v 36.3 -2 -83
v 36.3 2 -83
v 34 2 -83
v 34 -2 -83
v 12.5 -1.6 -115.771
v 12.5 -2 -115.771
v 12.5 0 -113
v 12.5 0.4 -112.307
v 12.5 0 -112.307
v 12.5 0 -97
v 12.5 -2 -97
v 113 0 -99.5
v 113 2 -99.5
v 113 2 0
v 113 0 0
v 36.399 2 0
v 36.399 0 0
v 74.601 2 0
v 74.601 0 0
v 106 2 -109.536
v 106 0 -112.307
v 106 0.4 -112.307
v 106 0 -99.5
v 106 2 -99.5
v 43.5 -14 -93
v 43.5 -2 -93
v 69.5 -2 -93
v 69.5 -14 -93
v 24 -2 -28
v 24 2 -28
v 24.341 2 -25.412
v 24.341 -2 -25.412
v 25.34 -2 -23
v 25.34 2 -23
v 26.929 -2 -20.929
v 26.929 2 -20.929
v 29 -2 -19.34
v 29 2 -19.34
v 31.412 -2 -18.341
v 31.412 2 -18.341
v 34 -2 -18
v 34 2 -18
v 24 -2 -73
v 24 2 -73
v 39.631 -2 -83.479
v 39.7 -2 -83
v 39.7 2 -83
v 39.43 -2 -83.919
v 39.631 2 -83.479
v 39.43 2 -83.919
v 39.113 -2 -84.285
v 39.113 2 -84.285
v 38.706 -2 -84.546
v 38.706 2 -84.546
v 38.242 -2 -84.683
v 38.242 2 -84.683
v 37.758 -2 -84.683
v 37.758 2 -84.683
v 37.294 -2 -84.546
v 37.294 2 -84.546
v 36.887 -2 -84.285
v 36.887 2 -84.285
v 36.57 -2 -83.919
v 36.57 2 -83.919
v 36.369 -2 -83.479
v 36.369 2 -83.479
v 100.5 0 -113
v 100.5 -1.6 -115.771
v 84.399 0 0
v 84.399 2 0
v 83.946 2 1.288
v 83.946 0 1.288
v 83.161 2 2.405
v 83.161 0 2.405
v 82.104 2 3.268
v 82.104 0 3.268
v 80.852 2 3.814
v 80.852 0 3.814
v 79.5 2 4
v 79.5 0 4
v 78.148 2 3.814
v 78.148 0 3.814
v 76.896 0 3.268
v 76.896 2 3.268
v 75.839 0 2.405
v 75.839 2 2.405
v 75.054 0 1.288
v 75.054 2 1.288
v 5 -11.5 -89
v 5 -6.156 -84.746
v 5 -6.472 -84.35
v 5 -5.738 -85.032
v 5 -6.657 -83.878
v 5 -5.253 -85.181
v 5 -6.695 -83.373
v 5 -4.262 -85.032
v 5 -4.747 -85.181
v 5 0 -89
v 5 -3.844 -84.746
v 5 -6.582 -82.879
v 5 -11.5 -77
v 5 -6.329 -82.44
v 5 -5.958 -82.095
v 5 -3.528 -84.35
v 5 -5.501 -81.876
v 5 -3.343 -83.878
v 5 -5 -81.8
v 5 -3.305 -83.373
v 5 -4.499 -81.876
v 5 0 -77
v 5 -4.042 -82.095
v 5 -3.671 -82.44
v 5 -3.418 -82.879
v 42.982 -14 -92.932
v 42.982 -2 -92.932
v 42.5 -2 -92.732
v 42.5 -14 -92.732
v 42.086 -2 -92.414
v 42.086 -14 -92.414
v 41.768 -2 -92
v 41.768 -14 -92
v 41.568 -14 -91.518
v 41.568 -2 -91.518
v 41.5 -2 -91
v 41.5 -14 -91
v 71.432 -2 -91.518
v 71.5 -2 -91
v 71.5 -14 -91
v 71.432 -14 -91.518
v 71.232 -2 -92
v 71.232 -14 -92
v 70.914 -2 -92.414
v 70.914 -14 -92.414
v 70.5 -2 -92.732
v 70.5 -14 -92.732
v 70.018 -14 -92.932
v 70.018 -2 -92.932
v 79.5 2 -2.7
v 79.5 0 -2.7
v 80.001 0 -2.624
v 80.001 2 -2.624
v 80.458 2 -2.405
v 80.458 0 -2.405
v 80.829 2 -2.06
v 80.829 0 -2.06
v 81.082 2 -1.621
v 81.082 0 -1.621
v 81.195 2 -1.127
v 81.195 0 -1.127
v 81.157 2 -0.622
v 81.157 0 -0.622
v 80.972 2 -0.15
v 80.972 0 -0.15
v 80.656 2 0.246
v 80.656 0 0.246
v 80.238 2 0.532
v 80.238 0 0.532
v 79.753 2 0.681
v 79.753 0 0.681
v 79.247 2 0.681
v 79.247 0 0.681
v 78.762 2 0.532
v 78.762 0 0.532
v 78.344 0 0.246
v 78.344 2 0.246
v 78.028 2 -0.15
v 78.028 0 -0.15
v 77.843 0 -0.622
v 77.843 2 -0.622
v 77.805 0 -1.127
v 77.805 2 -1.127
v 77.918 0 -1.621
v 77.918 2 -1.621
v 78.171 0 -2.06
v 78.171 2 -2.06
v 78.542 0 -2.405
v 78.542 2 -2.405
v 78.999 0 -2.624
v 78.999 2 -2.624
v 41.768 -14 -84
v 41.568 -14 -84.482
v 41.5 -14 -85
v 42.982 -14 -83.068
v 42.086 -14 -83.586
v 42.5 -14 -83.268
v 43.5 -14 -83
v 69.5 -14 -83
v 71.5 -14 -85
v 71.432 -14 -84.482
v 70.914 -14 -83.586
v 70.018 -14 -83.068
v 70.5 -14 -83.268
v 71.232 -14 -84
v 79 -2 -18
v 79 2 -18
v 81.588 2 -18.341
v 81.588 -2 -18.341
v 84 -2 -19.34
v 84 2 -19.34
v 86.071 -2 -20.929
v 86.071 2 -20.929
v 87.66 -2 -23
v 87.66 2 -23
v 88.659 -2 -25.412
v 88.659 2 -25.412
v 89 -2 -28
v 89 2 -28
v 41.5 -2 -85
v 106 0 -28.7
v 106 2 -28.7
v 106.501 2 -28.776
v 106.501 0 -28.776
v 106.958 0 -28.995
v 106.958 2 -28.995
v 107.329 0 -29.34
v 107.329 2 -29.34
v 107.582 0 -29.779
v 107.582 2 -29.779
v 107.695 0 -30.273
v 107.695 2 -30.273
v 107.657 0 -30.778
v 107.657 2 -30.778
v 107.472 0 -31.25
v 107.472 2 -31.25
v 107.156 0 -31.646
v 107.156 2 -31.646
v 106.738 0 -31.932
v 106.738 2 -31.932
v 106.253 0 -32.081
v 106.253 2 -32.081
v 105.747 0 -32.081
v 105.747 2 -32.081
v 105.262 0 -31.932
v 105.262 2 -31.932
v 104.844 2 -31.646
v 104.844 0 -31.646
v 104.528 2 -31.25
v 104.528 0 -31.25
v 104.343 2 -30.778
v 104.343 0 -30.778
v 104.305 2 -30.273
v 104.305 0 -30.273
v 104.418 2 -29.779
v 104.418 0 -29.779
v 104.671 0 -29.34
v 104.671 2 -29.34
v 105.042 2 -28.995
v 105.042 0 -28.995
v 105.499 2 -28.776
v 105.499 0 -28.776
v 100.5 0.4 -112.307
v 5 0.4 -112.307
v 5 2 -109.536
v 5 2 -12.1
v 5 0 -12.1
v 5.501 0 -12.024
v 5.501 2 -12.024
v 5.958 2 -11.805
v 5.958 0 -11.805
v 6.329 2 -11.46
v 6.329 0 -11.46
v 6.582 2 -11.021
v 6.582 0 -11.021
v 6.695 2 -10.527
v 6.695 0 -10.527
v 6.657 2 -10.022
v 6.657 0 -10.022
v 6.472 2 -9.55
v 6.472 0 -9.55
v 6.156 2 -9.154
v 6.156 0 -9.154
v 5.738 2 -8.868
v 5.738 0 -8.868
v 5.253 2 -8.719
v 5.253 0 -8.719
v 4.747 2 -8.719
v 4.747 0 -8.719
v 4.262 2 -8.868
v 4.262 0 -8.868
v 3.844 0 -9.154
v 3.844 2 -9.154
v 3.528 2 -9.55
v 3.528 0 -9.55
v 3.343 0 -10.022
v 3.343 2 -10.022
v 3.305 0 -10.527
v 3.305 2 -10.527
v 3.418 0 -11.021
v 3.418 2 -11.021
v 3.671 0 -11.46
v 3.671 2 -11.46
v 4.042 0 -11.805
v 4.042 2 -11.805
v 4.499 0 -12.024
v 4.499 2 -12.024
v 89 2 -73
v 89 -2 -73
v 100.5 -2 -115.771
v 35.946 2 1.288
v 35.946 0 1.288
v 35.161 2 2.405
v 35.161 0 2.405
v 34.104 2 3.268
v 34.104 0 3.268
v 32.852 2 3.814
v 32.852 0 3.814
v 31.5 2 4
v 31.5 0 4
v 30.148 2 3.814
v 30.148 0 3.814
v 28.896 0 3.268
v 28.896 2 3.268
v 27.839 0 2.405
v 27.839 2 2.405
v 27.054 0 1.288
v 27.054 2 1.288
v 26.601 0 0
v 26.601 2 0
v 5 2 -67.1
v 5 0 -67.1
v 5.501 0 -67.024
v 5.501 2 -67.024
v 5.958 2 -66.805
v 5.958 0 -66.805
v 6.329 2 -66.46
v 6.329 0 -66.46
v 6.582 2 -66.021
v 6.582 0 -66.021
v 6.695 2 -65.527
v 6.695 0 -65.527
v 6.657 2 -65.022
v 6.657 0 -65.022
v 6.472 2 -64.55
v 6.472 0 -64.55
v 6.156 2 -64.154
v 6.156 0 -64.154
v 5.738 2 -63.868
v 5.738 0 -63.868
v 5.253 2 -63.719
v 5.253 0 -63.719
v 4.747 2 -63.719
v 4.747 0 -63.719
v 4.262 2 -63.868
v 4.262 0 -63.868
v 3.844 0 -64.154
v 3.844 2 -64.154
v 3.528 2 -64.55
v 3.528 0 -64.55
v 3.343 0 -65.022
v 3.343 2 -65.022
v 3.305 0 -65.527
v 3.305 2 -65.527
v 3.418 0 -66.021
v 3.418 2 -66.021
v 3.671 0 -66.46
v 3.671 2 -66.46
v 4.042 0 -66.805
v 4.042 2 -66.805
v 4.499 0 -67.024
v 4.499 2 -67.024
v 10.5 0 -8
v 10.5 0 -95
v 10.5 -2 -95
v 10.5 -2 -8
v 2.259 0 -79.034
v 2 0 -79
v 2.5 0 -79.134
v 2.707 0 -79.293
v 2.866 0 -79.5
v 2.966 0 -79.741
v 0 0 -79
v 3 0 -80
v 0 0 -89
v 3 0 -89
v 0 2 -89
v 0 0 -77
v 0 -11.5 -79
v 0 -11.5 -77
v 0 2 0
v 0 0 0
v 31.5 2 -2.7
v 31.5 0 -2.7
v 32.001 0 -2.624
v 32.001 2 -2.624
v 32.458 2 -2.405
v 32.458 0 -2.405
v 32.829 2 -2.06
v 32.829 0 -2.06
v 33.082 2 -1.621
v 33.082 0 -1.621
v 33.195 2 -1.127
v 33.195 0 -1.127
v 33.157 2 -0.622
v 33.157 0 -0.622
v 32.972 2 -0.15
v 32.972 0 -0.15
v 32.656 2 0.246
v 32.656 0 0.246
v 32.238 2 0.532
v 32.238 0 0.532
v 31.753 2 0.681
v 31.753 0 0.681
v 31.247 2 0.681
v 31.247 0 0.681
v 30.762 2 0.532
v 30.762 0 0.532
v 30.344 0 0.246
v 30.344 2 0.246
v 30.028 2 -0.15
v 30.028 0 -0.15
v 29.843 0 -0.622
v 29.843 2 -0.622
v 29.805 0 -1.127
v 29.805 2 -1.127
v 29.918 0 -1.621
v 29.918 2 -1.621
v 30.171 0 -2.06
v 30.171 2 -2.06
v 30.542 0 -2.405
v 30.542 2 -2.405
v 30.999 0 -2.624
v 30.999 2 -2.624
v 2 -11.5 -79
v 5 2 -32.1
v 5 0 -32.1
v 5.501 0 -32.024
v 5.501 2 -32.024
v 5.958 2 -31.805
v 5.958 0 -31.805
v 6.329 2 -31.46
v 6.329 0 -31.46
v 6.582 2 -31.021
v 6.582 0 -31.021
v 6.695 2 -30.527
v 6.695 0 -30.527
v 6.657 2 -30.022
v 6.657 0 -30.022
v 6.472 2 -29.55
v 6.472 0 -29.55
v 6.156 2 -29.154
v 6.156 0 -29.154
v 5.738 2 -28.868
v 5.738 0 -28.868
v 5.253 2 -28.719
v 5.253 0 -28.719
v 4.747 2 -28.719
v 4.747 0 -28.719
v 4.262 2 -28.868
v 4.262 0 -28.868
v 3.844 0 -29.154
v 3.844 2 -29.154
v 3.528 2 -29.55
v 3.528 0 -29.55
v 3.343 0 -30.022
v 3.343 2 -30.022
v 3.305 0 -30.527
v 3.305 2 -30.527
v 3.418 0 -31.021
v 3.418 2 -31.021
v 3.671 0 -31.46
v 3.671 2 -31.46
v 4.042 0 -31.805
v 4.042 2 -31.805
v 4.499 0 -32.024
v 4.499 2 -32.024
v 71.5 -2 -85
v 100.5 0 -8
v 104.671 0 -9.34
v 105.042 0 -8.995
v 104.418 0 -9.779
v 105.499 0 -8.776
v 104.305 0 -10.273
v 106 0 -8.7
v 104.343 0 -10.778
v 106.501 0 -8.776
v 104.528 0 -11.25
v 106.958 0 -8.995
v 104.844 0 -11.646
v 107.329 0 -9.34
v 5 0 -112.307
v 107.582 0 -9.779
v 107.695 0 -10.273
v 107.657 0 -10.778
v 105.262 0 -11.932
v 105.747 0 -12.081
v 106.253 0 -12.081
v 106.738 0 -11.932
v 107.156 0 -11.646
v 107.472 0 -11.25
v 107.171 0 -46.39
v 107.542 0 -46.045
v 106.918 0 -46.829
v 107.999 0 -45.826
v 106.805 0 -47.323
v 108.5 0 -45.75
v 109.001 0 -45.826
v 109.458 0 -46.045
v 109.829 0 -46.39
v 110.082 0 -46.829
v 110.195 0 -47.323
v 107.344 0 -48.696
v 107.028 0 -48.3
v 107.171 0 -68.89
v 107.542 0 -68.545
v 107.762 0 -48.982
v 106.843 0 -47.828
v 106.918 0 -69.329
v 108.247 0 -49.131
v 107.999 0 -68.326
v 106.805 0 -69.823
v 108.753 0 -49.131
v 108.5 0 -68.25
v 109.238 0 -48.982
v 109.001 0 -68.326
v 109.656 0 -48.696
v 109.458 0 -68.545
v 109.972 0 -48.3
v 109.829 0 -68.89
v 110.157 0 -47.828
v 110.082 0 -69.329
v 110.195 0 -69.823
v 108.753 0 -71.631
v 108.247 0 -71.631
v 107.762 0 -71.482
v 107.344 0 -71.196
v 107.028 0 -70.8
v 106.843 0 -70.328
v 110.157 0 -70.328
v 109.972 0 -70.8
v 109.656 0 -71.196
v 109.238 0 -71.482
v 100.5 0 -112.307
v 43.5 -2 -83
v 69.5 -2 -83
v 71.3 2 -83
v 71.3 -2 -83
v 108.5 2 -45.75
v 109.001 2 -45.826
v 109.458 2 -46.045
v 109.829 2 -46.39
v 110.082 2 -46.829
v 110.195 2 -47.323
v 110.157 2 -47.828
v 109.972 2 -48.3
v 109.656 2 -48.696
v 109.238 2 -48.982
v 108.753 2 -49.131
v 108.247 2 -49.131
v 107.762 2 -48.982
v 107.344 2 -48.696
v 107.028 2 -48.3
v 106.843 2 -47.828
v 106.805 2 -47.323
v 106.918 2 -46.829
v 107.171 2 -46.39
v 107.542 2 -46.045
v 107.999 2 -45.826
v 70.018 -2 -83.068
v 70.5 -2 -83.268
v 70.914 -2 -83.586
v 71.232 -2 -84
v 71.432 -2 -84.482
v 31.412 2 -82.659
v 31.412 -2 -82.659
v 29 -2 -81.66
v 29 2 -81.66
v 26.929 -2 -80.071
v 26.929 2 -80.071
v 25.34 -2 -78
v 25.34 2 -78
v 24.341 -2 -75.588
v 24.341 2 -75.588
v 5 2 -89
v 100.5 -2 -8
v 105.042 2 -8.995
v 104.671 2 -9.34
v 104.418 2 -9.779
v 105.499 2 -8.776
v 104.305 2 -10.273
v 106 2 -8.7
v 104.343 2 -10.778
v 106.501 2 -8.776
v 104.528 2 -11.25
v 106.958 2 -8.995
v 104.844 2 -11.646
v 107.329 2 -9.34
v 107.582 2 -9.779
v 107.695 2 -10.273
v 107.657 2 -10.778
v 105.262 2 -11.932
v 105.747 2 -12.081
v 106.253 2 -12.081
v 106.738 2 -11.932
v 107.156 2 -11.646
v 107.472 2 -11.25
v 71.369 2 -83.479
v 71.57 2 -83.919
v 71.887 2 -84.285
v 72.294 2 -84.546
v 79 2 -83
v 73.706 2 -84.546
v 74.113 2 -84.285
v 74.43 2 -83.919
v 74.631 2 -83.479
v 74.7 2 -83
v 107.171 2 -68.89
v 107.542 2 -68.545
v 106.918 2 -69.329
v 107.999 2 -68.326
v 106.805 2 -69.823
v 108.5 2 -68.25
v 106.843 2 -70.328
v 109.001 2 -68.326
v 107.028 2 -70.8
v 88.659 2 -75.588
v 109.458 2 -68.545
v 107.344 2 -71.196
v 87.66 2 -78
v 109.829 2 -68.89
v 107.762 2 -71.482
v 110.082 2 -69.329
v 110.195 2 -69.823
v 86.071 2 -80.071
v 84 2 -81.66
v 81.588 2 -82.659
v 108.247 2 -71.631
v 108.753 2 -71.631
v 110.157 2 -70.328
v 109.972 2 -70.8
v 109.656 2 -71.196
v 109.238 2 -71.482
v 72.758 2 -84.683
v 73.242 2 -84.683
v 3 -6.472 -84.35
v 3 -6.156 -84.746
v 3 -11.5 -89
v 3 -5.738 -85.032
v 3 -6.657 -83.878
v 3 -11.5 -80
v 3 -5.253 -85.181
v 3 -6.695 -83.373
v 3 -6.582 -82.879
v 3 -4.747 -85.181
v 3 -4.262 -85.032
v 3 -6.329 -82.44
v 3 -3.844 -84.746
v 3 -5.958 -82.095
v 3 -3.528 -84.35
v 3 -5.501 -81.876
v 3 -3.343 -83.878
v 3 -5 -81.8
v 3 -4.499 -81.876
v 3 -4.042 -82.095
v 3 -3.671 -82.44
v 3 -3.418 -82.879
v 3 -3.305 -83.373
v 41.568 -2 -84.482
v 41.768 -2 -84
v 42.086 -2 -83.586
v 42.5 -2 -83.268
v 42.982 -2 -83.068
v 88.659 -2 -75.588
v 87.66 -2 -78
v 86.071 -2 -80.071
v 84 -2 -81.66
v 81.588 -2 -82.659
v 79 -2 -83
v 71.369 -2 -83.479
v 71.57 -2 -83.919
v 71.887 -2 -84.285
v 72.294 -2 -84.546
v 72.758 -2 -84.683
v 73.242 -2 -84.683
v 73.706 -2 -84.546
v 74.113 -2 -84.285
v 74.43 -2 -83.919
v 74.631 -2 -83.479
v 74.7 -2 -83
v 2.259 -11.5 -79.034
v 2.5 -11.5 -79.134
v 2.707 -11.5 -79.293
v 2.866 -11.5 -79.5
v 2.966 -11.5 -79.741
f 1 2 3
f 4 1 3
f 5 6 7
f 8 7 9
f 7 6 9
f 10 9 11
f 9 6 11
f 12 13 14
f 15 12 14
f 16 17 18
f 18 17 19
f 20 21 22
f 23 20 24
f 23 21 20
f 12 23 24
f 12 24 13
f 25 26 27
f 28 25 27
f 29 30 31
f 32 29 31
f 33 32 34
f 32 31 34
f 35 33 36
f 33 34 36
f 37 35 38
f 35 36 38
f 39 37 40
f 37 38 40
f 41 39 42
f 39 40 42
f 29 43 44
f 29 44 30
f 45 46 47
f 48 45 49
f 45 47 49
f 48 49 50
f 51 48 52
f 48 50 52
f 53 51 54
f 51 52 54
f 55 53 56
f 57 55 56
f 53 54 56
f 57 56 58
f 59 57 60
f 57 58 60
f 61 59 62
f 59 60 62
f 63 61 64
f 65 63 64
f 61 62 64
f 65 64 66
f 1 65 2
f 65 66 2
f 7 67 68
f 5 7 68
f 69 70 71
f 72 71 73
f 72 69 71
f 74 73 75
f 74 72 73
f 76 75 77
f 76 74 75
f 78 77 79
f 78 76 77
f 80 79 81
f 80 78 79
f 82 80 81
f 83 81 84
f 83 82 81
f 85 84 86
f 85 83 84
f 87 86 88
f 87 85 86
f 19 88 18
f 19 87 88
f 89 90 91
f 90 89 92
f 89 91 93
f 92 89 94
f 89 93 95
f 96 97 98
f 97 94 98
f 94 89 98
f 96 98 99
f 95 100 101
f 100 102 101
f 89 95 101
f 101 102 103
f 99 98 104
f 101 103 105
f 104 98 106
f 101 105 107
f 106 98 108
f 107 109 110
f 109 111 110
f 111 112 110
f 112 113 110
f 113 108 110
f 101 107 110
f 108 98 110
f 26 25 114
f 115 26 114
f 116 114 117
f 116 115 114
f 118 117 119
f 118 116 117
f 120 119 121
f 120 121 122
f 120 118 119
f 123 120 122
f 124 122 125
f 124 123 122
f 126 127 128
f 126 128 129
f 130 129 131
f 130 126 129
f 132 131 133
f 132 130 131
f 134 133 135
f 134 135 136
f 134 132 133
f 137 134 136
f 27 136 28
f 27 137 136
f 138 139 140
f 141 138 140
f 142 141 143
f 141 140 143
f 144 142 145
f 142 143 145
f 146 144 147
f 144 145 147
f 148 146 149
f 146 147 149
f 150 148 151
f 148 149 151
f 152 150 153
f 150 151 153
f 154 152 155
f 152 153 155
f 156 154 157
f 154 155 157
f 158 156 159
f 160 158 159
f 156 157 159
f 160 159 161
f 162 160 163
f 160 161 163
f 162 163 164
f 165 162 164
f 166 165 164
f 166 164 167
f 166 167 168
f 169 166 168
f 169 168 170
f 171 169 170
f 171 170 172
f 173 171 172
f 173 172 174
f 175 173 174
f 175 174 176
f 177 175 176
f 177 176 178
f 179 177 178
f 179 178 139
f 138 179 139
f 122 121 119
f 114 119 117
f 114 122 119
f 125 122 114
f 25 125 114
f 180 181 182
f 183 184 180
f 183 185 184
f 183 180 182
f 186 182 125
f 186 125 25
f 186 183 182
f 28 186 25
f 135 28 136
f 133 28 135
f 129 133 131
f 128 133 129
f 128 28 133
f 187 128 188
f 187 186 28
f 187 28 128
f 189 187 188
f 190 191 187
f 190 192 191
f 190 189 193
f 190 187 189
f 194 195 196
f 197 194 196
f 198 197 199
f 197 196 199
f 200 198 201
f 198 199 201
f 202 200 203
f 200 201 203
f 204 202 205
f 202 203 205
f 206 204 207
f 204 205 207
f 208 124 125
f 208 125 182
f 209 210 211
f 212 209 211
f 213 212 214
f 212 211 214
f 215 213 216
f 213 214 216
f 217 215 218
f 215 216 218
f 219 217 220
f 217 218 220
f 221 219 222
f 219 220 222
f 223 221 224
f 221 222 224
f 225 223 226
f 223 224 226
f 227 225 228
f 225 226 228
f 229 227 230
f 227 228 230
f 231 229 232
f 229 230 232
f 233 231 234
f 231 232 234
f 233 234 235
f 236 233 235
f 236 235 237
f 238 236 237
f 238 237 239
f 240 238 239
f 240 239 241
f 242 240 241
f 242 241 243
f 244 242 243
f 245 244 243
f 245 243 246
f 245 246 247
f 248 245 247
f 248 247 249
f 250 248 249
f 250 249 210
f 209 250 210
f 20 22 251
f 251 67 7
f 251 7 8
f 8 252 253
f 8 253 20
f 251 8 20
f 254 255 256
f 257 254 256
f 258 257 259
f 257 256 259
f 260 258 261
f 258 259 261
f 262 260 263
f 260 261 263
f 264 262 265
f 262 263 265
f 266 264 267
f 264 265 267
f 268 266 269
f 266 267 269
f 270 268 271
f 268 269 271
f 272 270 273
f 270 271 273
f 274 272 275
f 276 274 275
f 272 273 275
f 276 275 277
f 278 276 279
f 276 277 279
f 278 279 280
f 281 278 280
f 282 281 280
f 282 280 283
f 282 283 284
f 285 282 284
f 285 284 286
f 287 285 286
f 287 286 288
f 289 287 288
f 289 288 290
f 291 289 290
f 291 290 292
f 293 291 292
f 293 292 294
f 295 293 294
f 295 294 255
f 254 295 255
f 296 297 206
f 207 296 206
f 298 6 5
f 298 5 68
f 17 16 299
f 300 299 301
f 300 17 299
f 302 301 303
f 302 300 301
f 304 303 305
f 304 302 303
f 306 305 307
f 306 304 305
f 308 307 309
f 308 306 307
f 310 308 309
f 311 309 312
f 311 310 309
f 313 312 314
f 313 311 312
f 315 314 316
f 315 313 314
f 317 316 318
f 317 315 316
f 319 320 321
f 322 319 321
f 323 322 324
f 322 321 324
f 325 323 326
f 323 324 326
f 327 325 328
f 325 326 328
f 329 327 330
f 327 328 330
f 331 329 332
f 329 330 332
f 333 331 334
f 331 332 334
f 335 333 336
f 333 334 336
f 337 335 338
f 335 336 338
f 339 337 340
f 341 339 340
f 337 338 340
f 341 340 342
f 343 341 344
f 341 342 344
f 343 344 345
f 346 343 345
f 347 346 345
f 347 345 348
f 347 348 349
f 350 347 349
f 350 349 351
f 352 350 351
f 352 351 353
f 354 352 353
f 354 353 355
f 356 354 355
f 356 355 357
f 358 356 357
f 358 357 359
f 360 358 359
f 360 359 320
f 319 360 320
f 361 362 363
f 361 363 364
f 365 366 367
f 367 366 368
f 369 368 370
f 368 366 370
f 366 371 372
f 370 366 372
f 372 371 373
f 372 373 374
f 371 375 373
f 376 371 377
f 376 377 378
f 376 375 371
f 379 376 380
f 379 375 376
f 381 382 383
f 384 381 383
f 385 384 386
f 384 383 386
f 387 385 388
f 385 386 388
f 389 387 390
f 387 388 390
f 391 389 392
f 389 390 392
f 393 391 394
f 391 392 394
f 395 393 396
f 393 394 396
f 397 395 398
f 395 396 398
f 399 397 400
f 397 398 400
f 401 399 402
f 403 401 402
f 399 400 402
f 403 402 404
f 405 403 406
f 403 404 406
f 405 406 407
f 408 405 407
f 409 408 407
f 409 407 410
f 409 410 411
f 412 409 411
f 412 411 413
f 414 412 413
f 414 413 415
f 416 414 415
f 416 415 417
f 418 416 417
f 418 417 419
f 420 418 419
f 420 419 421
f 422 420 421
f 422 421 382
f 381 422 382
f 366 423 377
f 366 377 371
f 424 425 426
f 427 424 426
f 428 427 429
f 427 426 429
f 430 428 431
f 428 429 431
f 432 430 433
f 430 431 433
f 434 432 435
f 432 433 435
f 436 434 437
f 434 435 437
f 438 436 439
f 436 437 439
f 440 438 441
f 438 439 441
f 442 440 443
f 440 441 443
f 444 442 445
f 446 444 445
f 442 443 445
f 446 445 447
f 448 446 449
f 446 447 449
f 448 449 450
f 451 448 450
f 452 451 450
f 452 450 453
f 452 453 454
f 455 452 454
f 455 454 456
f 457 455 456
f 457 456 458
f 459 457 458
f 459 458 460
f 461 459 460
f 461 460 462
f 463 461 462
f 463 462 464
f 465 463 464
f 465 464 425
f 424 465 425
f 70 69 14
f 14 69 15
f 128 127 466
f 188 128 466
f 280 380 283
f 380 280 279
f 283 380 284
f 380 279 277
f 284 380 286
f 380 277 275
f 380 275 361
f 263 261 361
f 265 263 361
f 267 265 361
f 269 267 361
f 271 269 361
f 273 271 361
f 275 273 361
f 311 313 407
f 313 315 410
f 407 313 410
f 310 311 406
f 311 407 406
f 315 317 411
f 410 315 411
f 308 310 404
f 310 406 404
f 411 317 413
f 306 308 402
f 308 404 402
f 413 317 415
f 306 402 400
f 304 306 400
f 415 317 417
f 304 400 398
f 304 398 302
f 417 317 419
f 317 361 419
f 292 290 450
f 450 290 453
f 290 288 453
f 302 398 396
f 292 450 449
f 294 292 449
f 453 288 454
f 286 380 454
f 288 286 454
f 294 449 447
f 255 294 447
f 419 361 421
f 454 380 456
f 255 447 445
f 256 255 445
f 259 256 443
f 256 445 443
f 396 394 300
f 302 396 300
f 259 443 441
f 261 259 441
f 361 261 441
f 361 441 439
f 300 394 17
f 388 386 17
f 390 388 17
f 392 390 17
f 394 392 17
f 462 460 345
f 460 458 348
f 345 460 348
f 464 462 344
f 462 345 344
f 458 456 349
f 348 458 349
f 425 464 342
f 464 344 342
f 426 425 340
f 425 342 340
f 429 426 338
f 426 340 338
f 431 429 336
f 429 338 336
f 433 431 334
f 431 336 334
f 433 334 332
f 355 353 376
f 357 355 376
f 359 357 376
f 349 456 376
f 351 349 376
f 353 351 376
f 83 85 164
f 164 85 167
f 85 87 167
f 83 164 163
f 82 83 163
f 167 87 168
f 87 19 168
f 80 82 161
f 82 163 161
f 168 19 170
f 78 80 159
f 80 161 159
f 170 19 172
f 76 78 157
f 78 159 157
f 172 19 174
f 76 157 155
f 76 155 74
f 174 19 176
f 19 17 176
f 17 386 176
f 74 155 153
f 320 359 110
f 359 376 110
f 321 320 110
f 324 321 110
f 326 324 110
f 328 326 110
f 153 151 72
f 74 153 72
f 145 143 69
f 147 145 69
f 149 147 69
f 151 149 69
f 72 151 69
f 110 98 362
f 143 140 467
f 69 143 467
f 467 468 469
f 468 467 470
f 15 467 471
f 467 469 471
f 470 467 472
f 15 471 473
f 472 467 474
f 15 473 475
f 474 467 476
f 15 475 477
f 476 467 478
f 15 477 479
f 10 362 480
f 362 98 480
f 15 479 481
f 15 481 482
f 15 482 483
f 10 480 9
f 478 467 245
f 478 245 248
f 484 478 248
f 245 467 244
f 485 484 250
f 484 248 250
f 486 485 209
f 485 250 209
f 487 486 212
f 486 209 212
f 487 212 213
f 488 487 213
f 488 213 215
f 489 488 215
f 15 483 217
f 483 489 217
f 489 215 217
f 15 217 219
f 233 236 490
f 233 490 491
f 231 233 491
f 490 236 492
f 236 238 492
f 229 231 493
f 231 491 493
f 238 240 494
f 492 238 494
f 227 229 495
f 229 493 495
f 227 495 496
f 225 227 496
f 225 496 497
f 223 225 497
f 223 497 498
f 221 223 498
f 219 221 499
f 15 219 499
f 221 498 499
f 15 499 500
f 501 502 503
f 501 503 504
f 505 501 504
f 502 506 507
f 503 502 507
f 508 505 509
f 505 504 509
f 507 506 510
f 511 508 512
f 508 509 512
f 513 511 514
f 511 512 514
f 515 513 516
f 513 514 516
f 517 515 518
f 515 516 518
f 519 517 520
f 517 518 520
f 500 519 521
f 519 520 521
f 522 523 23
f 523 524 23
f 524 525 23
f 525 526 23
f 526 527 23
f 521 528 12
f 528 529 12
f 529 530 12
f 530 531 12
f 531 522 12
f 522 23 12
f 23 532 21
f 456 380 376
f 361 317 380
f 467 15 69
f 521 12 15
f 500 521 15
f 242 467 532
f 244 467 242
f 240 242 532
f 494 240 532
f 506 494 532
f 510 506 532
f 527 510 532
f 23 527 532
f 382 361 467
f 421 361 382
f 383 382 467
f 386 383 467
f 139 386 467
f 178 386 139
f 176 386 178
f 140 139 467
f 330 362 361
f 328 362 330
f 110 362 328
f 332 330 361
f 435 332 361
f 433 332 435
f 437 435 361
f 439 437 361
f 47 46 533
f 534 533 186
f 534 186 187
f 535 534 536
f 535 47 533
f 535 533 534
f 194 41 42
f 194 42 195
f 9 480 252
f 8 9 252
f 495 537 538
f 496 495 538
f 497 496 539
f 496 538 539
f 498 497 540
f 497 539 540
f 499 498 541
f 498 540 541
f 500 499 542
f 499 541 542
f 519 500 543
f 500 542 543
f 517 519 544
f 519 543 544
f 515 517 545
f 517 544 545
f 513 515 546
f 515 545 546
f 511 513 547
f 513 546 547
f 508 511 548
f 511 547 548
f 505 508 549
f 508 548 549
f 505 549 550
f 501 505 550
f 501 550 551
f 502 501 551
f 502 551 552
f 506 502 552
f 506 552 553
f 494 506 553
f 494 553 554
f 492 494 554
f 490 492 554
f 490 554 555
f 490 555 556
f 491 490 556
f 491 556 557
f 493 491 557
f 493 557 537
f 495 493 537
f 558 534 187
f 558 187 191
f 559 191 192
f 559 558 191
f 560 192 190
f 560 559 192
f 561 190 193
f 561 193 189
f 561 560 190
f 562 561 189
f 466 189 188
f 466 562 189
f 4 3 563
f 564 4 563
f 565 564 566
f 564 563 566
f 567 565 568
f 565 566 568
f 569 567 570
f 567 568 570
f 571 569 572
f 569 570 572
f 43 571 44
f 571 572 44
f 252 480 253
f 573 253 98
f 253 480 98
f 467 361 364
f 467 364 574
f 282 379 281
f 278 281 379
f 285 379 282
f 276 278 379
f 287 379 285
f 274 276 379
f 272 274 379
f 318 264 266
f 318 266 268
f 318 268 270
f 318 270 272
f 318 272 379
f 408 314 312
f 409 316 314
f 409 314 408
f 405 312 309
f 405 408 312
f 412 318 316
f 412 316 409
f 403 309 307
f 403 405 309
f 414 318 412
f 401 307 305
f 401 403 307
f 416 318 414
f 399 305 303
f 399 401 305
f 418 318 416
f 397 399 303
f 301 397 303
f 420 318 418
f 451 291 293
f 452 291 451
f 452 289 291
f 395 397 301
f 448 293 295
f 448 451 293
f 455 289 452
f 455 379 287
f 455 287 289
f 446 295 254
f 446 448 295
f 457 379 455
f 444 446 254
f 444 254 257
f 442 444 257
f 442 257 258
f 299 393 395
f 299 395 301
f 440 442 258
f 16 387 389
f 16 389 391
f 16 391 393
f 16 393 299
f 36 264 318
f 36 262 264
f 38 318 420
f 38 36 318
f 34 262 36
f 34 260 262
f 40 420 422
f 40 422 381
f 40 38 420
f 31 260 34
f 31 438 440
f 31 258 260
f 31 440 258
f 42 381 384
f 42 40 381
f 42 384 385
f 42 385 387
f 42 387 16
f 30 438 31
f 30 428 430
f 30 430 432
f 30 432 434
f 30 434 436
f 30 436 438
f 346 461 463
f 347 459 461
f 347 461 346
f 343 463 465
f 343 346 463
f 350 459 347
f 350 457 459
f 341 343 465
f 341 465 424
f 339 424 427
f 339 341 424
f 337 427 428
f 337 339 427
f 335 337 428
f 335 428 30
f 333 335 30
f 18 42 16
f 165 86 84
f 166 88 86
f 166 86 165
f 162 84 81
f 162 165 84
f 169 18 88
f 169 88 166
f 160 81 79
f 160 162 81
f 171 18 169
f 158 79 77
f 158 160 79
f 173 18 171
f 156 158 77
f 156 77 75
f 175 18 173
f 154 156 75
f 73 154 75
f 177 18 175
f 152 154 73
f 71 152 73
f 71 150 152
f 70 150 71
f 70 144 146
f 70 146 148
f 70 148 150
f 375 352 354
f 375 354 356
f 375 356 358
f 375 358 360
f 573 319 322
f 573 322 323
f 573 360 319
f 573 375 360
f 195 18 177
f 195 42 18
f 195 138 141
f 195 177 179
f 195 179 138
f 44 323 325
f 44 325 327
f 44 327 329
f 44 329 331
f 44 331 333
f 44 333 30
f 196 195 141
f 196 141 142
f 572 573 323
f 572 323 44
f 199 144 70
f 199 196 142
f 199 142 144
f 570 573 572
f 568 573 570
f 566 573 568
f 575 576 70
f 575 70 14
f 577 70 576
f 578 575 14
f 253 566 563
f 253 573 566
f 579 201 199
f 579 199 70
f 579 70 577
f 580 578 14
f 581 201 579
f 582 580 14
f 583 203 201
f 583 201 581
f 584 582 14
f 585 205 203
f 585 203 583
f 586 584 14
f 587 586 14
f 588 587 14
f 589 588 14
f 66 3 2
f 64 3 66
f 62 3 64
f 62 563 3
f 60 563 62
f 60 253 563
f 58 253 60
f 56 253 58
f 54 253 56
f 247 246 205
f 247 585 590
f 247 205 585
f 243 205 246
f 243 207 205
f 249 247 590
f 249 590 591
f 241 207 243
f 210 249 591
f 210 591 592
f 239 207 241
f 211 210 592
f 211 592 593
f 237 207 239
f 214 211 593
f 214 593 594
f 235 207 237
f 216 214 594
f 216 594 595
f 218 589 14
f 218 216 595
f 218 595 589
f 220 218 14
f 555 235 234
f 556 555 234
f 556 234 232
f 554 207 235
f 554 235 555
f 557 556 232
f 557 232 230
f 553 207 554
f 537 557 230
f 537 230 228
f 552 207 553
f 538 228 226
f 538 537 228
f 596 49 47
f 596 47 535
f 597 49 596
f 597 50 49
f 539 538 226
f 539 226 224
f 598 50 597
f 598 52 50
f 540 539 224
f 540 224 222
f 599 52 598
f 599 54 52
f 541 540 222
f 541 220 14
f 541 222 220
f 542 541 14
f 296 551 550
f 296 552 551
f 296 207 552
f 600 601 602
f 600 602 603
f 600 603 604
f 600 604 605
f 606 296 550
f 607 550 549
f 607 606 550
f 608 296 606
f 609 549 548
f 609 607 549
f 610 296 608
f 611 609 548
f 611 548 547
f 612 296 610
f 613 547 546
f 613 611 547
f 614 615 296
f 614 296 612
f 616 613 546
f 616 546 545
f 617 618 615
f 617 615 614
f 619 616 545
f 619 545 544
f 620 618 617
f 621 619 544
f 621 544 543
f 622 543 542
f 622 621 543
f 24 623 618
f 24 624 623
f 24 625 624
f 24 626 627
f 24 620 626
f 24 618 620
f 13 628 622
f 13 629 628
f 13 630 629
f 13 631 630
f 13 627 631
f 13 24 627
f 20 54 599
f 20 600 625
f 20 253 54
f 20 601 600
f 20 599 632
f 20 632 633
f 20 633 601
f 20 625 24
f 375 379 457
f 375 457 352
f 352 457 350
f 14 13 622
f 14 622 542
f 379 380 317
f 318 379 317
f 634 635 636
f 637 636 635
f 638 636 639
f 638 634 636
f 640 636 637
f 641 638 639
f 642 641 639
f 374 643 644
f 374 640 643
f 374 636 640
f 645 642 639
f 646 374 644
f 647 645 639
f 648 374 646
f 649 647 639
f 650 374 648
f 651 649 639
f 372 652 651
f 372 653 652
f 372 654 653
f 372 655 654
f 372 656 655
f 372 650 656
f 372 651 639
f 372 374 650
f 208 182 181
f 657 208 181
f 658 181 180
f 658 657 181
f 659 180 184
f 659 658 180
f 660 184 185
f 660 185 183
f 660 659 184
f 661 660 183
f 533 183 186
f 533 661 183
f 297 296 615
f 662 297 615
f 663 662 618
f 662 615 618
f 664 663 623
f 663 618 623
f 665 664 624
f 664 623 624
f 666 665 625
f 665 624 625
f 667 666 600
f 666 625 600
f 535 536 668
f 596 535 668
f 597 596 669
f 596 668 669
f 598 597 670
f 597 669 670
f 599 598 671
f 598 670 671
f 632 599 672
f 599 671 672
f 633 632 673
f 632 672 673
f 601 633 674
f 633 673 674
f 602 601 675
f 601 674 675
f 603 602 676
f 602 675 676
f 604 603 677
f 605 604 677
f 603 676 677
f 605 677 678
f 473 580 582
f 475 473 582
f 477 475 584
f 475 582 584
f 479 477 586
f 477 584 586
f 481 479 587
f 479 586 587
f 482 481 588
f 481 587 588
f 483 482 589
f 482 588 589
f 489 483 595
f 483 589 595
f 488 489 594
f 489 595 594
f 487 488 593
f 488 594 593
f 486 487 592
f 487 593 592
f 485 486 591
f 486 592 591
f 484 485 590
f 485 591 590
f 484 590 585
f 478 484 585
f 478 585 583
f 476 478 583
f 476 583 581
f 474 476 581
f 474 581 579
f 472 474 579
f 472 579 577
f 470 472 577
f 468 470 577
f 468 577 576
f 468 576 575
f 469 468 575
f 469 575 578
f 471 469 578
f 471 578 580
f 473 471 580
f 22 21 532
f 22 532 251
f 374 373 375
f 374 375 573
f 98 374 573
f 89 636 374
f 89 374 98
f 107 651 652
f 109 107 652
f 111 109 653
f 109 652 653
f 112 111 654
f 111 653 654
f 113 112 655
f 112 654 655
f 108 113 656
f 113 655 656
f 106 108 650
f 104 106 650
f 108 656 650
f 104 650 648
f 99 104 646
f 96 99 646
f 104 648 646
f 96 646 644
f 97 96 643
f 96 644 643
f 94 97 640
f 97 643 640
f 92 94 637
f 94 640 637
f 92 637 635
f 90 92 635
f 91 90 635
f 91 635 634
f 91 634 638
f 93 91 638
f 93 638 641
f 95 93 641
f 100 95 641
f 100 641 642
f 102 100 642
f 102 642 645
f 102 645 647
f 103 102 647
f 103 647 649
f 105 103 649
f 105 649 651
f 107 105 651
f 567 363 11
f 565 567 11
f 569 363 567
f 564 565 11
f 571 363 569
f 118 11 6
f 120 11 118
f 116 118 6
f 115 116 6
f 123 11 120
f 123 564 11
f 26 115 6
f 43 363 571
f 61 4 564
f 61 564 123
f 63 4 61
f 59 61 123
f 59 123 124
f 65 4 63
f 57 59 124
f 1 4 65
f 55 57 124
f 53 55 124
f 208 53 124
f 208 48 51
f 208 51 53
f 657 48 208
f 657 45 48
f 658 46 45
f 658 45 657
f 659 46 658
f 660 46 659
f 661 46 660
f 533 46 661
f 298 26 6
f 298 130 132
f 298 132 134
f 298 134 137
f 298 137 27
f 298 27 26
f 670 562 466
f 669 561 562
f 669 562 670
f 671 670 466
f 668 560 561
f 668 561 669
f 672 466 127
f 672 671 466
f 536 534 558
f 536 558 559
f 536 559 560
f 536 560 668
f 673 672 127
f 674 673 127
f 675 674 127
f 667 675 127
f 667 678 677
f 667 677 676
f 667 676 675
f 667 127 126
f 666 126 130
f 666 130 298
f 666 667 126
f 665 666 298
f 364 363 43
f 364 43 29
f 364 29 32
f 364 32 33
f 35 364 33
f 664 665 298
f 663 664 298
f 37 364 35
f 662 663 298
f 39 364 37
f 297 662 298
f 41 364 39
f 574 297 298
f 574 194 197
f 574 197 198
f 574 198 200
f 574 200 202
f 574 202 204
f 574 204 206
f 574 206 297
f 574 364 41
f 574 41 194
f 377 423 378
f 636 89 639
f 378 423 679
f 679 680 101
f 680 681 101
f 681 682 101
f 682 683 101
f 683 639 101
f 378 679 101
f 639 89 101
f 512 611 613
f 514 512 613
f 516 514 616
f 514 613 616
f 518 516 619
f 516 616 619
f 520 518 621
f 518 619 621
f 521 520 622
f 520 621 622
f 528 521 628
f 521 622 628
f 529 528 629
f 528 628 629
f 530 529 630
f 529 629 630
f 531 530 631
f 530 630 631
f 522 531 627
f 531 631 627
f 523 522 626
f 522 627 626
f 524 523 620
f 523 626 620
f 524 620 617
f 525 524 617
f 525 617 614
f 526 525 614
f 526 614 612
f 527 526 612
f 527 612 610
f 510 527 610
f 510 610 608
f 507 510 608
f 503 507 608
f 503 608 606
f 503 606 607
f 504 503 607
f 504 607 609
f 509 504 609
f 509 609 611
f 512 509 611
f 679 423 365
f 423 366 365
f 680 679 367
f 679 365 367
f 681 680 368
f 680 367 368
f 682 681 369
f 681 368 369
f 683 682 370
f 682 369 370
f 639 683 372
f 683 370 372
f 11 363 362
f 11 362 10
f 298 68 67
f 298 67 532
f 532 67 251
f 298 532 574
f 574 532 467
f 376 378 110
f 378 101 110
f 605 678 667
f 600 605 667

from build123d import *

# Parameters (mm, degrees)
SKETCH_1_W               = 113
SKETCH_1_H               = 113
EXTRUDE_1_DEPTH          = 3
CUT_EXTRUDE_1_REACH      = 161.834
SKETCH_2_R               = 1.7
SKETCH_3_W               = 90
SKETCH_3_H               = 105
EXTRUDE_2_DEPTH          = 2
SKETCH_5_R               = 5
EXTRUDE_3_DEPTH          = 3
CUT_EXTRUDE_2_REACH      = 161.834
SKETCH_6_R               = 1.7
CUT_EXTRUDE_3_REACH      = 161.834
SKETCH_7_R               = 1.7
CUT_EXTRUDE_4_REACH      = 161.884
SKETCH_8_R               = 1.7
EXTRUDE_5_DEPTH          = 90
CUT_EXTRUDE_5_DEPTH      = 2
SKETCH_13_W              = 2
SKETCH_13_H              = 12
EXTRUDE_6_DEPTH          = 11.5
CUT_EXTRUDE_6_REACH      = 162.612
SKETCH_14_R              = 1.7
CUT_EXTRUDE_7_REACH      = 164.681
EXTRUDE_7_DEPTH          = 8.5
SKETCH_17_W              = 2
SKETCH_17_H              = 11.5
EXTRUDE_8_DEPTH          = 3
FILLET_1_R               = 1
CUT_EXTRUDE_8_DEPTH      = 163.681089759
SKETCH_20_W              = 113
SKETCH_20_H              = 12.124355653
CUT_EXTRUDE_9_DEPTH      = 1
CHAMFER_1_SIZE           = 1
SKETCH_21_W              = 7
SKETCH_21_H              = 13.5
CUT_EXTRUDE_10_DEPTH     = 163.681089759
SKETCH_22_W              = 5
SKETCH_22_H              = 24
CUT_EXTRUDE_11_DEPTH     = 163.681089759
SKETCH_23_W              = 2
SKETCH_23_H              = 19.464101615
CUT_EXTRUDE_12_DEPTH     = 2
CUT_EXTRUDE_START        = -2
CUT_EXTRUDE_13_OUTLINE_W = 93
CUT_EXTRUDE_13_OUTLINE_H = 1.228718708
CUT_EXTRUDE_13_DEPTH     = 2
SKETCH_25_W              = 0.692820323
SKETCH_25_H              = 0.4
CUT_EXTRUDE_14_DEPTH     = 5.5
SKETCH_26_W              = 0.692820323
SKETCH_26_H              = 0.4
CUT_EXTRUDE_15_DEPTH     = 7.5
SKETCH_27_W              = 113
SKETCH_27_H              = 105.875644347
CUT_EXTRUDE_16_DEPTH     = 163.339889035
SKETCH_29_W              = 10
SKETCH_29_H              = 5
CUT_EXTRUDE_17_DEPTH     = 163.185818036
SKETCH_30_W              = 10
SKETCH_30_H              = 2
CUT_EXTRUDE_18_DEPTH     = 37
SKETCH_31_W              = 10
SKETCH_31_H              = 27
EXTRUDE_9_DEPTH          = 1
CUT_EXTRUDE_19_REACH     = 164.056
SKETCH_32_W              = 65
SKETCH_32_H              = 65
SKETCH_33_W              = 30
SKETCH_33_H              = 10
EXTRUDE_10_DEPTH         = 12
EXTRUDE_11_DEPTH         = 12
EXTRUDE_START            = -4
EXTRUDE_11_2_OUTLINE_W   = 10
EXTRUDE_11_2_OUTLINE_H   = 7
EXTRUDE_11_2_DEPTH       = 4


# Read off the part's stored shape, not the designer's step: 切除-拉伸13, 凸台-拉伸11
with BuildPart() as part:
    # 草图1 → 凸台-拉伸1 (new body)
    with BuildSketch(Plane(origin=(0, 0, 0), x_dir=(1, 0, 0), z_dir=(0, 1, 0))):
        with Locations((56.5, 56.5)):
            Rectangle(SKETCH_1_W, SKETCH_1_H)
    extrude(amount=EXTRUDE_1_DEPTH)

    # 草图2 → 切除-拉伸1 (cut, up to next)
    with BuildSketch(Plane(origin=(0, 3, 0), x_dir=(1, 0, 0), z_dir=(0, 1, 0)), mode=Mode.PRIVATE) as cut_extrude_1_sk1:
        with Locations(Location((108.5, 69.95, 0), (0, 0, 270))):
            Circle(SKETCH_2_R)
    cut_extrude_1_tool1 = extrude(cut_extrude_1_sk1.sketch, amount=-CUT_EXTRUDE_1_REACH, mode=Mode.PRIVATE) & part.part
    # 草图2 → 切除-拉伸1 (cut, up to next)
    with BuildSketch(Plane(origin=(0, 3, 0), x_dir=(1, 0, 0), z_dir=(0, 1, 0)), mode=Mode.PRIVATE) as cut_extrude_1_sk2:
        with Locations(Location((108.5, 47.45, 0), (0, 0, 270))):
            Circle(SKETCH_2_R)
    cut_extrude_1_tool2 = extrude(cut_extrude_1_sk2.sketch, amount=-CUT_EXTRUDE_1_REACH, mode=Mode.PRIVATE) & part.part
    # 草图2 → 切除-拉伸1 (cut, up to next)
    with BuildSketch(Plane(origin=(0, 3, 0), x_dir=(1, 0, 0), z_dir=(0, 1, 0)), mode=Mode.PRIVATE) as cut_extrude_1_sk3:
        with Locations(Location((106, 30.4, 0), (0, 0, 270))):
            Circle(SKETCH_2_R)
    cut_extrude_1_tool3 = extrude(cut_extrude_1_sk3.sketch, amount=-CUT_EXTRUDE_1_REACH, mode=Mode.PRIVATE) & part.part
    # 草图2 → 切除-拉伸1 (cut, up to next)
    with BuildSketch(Plane(origin=(0, 3, 0), x_dir=(1, 0, 0), z_dir=(0, 1, 0)), mode=Mode.PRIVATE) as cut_extrude_1_sk4:
        with Locations(Location((106, 10.4, 0), (0, 0, 270))):
            Circle(SKETCH_2_R)
    cut_extrude_1_tool4 = extrude(cut_extrude_1_sk4.sketch, amount=-CUT_EXTRUDE_1_REACH, mode=Mode.PRIVATE) & part.part
    add(cut_extrude_1_tool1.solids().sort_by_distance((108.5, 3, -69.95))[0], mode=Mode.SUBTRACT)
    add(cut_extrude_1_tool2.solids().sort_by_distance((108.5, 3, -47.45))[0], mode=Mode.SUBTRACT)
    add(cut_extrude_1_tool3.solids().sort_by_distance((106, 3, -30.4))[0], mode=Mode.SUBTRACT)
    add(cut_extrude_1_tool4.solids().sort_by_distance((106, 3, -10.4))[0], mode=Mode.SUBTRACT)

    # 草图3 → 凸台-拉伸2 (add)
    with BuildSketch(Plane(origin=(0, 0, 0), x_dir=(1, 0, 0), z_dir=(0, 1, 0))):
        with Locations((55.5, 60.5)):
            Rectangle(SKETCH_3_W, SKETCH_3_H)
    extrude(amount=-EXTRUDE_2_DEPTH)

    # 草图5 → 凸台-拉伸3 (add)
    with BuildSketch(Plane.XZ):
        with Locations((79.5, -1)):
            Circle(SKETCH_5_R)
        with Locations((31.5, -1)):
            Circle(SKETCH_5_R)
    extrude(amount=-EXTRUDE_3_DEPTH)

    # 草图6 → 切除-拉伸2 (cut, up to next)
    with BuildSketch(Plane.XZ, mode=Mode.PRIVATE) as cut_extrude_2_sk1:
        with Locations(Location((31.5, -1, 0), (0, 0, 270))):
            Circle(SKETCH_6_R)
    cut_extrude_2_tool1 = extrude(cut_extrude_2_sk1.sketch, amount=-CUT_EXTRUDE_2_REACH, mode=Mode.PRIVATE) & part.part
    # 草图6 → 切除-拉伸2 (cut, up to next)
    with BuildSketch(Plane.XZ, mode=Mode.PRIVATE) as cut_extrude_2_sk2:
        with Locations(Location((79.5, -1, 0), (0, 0, 270))):
            Circle(SKETCH_6_R)
    cut_extrude_2_tool2 = extrude(cut_extrude_2_sk2.sketch, amount=-CUT_EXTRUDE_2_REACH, mode=Mode.PRIVATE) & part.part
    add(cut_extrude_2_tool1.solids().sort_by_distance((31.5, 0, -1))[0], mode=Mode.SUBTRACT)
    add(cut_extrude_2_tool2.solids().sort_by_distance((79.5, 0, -1))[0], mode=Mode.SUBTRACT)

    # 草图7 → 切除-拉伸3 (cut, up to next)
    with BuildSketch(Plane.XZ, mode=Mode.PRIVATE) as cut_extrude_3_sk1:
        with Locations(Location((5, -10.4, 0), (0, 0, 270))):
            Circle(SKETCH_7_R)
    cut_extrude_3_tool1 = extrude(cut_extrude_3_sk1.sketch, amount=-CUT_EXTRUDE_3_REACH, mode=Mode.PRIVATE) & part.part
    # 草图7 → 切除-拉伸3 (cut, up to next)
    with BuildSketch(Plane.XZ, mode=Mode.PRIVATE) as cut_extrude_3_sk2:
        with Locations(Location((5, -30.4, 0), (0, 0, 270))):
            Circle(SKETCH_7_R)
    cut_extrude_3_tool2 = extrude(cut_extrude_3_sk2.sketch, amount=-CUT_EXTRUDE_3_REACH, mode=Mode.PRIVATE) & part.part
    # 草图7 → 切除-拉伸3 (cut, up to next)
    with BuildSketch(Plane.XZ, mode=Mode.PRIVATE) as cut_extrude_3_sk3:
        with Locations(Location((5, -65.4, 0), (0, 0, 270))):
            Circle(SKETCH_7_R)
    cut_extrude_3_tool3 = extrude(cut_extrude_3_sk3.sketch, amount=-CUT_EXTRUDE_3_REACH, mode=Mode.PRIVATE) & part.part
    add(cut_extrude_3_tool1.solids().sort_by_distance((5, 0, -10.4))[0], mode=Mode.SUBTRACT)
    add(cut_extrude_3_tool2.solids().sort_by_distance((5, 0, -30.4))[0], mode=Mode.SUBTRACT)
    add(cut_extrude_3_tool3.solids().sort_by_distance((5, 0, -65.4))[0], mode=Mode.SUBTRACT)

    # 草图8 → 切除-拉伸4 (cut, up to next)
    with BuildSketch(Plane.XZ.offset(2), mode=Mode.PRIVATE) as cut_extrude_4_sk1:
        with Locations(Location((38, -83, 0), (0, 0, 270))):
            Circle(SKETCH_8_R)
    cut_extrude_4_tool1 = extrude(cut_extrude_4_sk1.sketch, amount=-CUT_EXTRUDE_4_REACH, mode=Mode.PRIVATE) & part.part
    # 草图8 → 切除-拉伸4 (cut, up to next)
    with BuildSketch(Plane.XZ.offset(2), mode=Mode.PRIVATE) as cut_extrude_4_sk2:
        with Locations(Location((73, -83, 0), (0, 0, 270))):
            Circle(SKETCH_8_R)
    cut_extrude_4_tool2 = extrude(cut_extrude_4_sk2.sketch, amount=-CUT_EXTRUDE_4_REACH, mode=Mode.PRIVATE) & part.part
    add(cut_extrude_4_tool1.solids().sort_by_distance((38, -2, -83))[0], mode=Mode.SUBTRACT)
    add(cut_extrude_4_tool2.solids().sort_by_distance((73, -2, -83))[0], mode=Mode.SUBTRACT)

    # 草图10 → 凸台-拉伸5 (add)
    with BuildSketch(Plane(origin=(100.5, 0, 0), x_dir=(0, 0, -1), z_dir=(1, 0, 0))):
        Polygon((113, 0), (116.464101615, -2), (113, -2), align=None)
    extrude(amount=-EXTRUDE_5_DEPTH)

    # 草图11 → 切除-拉伸5 (cut)
    with BuildSketch(Plane(origin=(0, -2, 0), x_dir=(1, 0, 0), z_dir=(0, 1, 0))):
        with BuildLine():
            Line((33, 83), (33, 53))
            ThreePointArc((33, 53), (38, 48), (43, 53))
            Line((43, 53), (43, 83))
            ThreePointArc((43, 83), (38, 88), (33, 83))
        make_face()
        with BuildLine():
            Line((68, 83), (68, 53))
            ThreePointArc((68, 53), (73, 48), (78, 53))
            Line((78, 53), (78, 83))
            ThreePointArc((78, 83), (73, 88), (68, 83))
        make_face()
    extrude(amount=CUT_EXTRUDE_5_DEPTH, mode=Mode.SUBTRACT)

    # 草图13 → 凸台-拉伸6 (add)
    with BuildSketch(Plane.XZ):
        with Locations((4, -83)):
            Rectangle(SKETCH_13_W, SKETCH_13_H)
    extrude(amount=EXTRUDE_6_DEPTH)

    # 草图14 → 切除-拉伸6 (cut, up to next)
    with BuildSketch(Plane.ZY.offset(-3), mode=Mode.PRIVATE) as cut_extrude_6_sk1:
        with Locations((-83.5, -5)):
            Circle(SKETCH_14_R)
    cut_extrude_6_tool1 = extrude(cut_extrude_6_sk1.sketch, amount=-CUT_EXTRUDE_6_REACH, mode=Mode.PRIVATE) & part.part
    add(cut_extrude_6_tool1.solids().sort_by_distance((3, -5, -83.5))[0], mode=Mode.SUBTRACT)

    # 草图15 → 切除-拉伸7 (cut, up to next)
    with BuildSketch(Plane.XZ, mode=Mode.PRIVATE) as cut_extrude_7_sk1:
        Polygon((113, -100.875644347), (106, -113), (113, -113), align=None)
    cut_extrude_7_tool1 = extrude(cut_extrude_7_sk1.sketch, amount=-CUT_EXTRUDE_7_REACH, mode=Mode.PRIVATE) & part.part
    add(cut_extrude_7_tool1.solids().sort_by_distance((110.666667, 0, -108.958548))[0], mode=Mode.SUBTRACT)

    # 草图16 → 凸台-拉伸7 (add)
    with BuildSketch(Plane.XZ):
        Polygon((113, -99.5), (107.5, -99.5), (107.5, -110.401923789), (113, -100.875644347), align=None)
    extrude(amount=EXTRUDE_7_DEPTH)

    # 草图17 → 凸台-拉伸8 (add)
    with BuildSketch(Plane.ZY.offset(-3)):
        with Locations((-78, -5.75)):
            Rectangle(SKETCH_17_W, SKETCH_17_H)
    extrude(amount=EXTRUDE_8_DEPTH)

    # 圆角1
    fillet_1_edges = [part.edges().sort_by_distance(p)[0] for p in [
        (3, -5.75, -79),
    ]]
    fillet(fillet_1_edges, radius=FILLET_1_R)

    # 草图19 → 切除-拉伸8 (cut, through all)
    with BuildSketch(Plane.ZY):
        Polygon((-113, 0), (-107.803847577, 3), (-113, 3), align=None)
    extrude(amount=-CUT_EXTRUDE_8_DEPTH, mode=Mode.SUBTRACT)

    # 草图20 → 切除-拉伸9 (cut)
    with BuildSketch(Plane(origin=(0, 3, 0), x_dir=(1, 0, 0), z_dir=(0, 1, 0))):
        with Locations((56.5, 106.937822173)):
            Rectangle(SKETCH_20_W, SKETCH_20_H)
    extrude(amount=-CUT_EXTRUDE_9_DEPTH, mode=Mode.SUBTRACT)

    # 倒角1
    chamfer_1_edges = [part.edges().sort_by_distance(p)[0] for p in [
        (56.5, 2, -100.875644347),
    ]]
    chamfer(chamfer_1_edges, length=CHAMFER_1_SIZE - 0.0001)  # a hair under: the kernel refuses the full size

    # 草图21 → 切除-拉伸10 (cut, through all)
    with BuildSketch(Plane.XZ.offset(8.5)):
        with Locations((109.5, -106.25)):
            Rectangle(SKETCH_21_W, SKETCH_21_H)
    extrude(amount=-CUT_EXTRUDE_10_DEPTH, mode=Mode.SUBTRACT)

    # 草图22 → 切除-拉伸11 (cut, through all)
    with BuildSketch(Plane.XZ):
        with Locations((2.5, -101)):
            Rectangle(SKETCH_22_W, SKETCH_22_H)
    extrude(amount=-CUT_EXTRUDE_11_DEPTH, mode=Mode.SUBTRACT)

    # 草图23 → 切除-拉伸12 (cut)
    with BuildSketch(Plane.XZ.offset(2)):
        with Locations((11.5, -106.732050808)):
            Rectangle(SKETCH_23_W, SKETCH_23_H)
    extrude(amount=-CUT_EXTRUDE_12_DEPTH, mode=Mode.SUBTRACT)

    # 切除-拉伸13 outline → 切除-拉伸13 (cut)
    with BuildSketch(Plane(origin=(0, 0, 0), x_dir=(1, 0, 0), z_dir=(0, 1, 0)).offset(CUT_EXTRUDE_START)):
        Polygon((9.5, 94), (12.5, 97), (9, 97), (9, 94), align=None)
        with Locations((55.5, 116.385640646)):
            Rectangle(CUT_EXTRUDE_13_OUTLINE_W, CUT_EXTRUDE_13_OUTLINE_H)
    extrude(amount=CUT_EXTRUDE_13_DEPTH, mode=Mode.SUBTRACT)

    # 草图25 → 切除-拉伸14 (cut)
    with BuildSketch(Plane(origin=(106, 0, 0), x_dir=(0, 0, -1), z_dir=(1, 0, 0))):
        with Locations((112.653589839, 0.2)):
            Rectangle(SKETCH_25_W, SKETCH_25_H)
    extrude(amount=-CUT_EXTRUDE_14_DEPTH, mode=Mode.SUBTRACT)

    # 草图26 → 切除-拉伸15 (cut)
    with BuildSketch(Plane.ZY.offset(-5)):
        with Locations((-112.653589839, 0.2)):
            Rectangle(SKETCH_26_W, SKETCH_26_H)
    extrude(amount=-CUT_EXTRUDE_15_DEPTH, mode=Mode.SUBTRACT)

    # 草图27 → 切除-拉伸16 (cut, through all)
    with BuildSketch(Plane(origin=(0, 2, 0), x_dir=(1, 0, 0), z_dir=(0, 1, 0))):
        with Locations((56.5, 48.937822174)):
            Rectangle(SKETCH_27_W, SKETCH_27_H)
    extrude(amount=CUT_EXTRUDE_16_DEPTH, mode=Mode.SUBTRACT)

    # 草图29 → 切除-拉伸17 (cut, through all)
    with BuildSketch(Plane.XZ):
        with Locations((38, -50.5)):
            Rectangle(SKETCH_29_W, SKETCH_29_H)
        with Locations((73, -50.5)):
            Rectangle(SKETCH_29_W, SKETCH_29_H)
    extrude(amount=CUT_EXTRUDE_17_DEPTH, mode=Mode.SUBTRACT)

    # 草图30 → 切除-拉伸18 (cut)
    with BuildSketch(Plane(origin=(0, 0, -48), x_dir=(-1, 0, 0), z_dir=(0, 0, -1))):
        with Locations((-38, -1)):
            Rectangle(SKETCH_30_W, SKETCH_30_H)
        with Locations((-73, -1)):
            Rectangle(SKETCH_30_W, SKETCH_30_H)
    extrude(amount=-CUT_EXTRUDE_18_DEPTH, mode=Mode.SUBTRACT)

    # 草图31 → 凸台-拉伸9 (add)
    with BuildSketch(Plane.XZ):
        with Locations((38, -24.5)):
            Rectangle(SKETCH_31_W, SKETCH_31_H)
        with Locations((73, -24.5)):
            Rectangle(SKETCH_31_W, SKETCH_31_H)
    extrude(amount=EXTRUDE_9_DEPTH)

    # 草图32 → 切除-拉伸19 (cut, up to next)
    with BuildSketch(Plane.XZ.offset(2), mode=Mode.PRIVATE) as cut_extrude_19_sk1:
        with Locations((56.5, -50.5)):
            Rectangle(SKETCH_32_W, SKETCH_32_H)
    cut_extrude_19_tool1 = extrude(cut_extrude_19_sk1.sketch, amount=-CUT_EXTRUDE_19_REACH, mode=Mode.PRIVATE) & part.part
    add(cut_extrude_19_tool1.solids().sort_by_distance((56.5, -2, -50.5))[0], mode=Mode.SUBTRACT)

    # 草图33 → 凸台-拉伸10 (add)
    with BuildSketch(Plane.XZ.offset(2)):
        with Locations((56.5, -88)):
            Rectangle(SKETCH_33_W, SKETCH_33_H)
    extrude(amount=EXTRUDE_10_DEPTH)

    # 凸台-拉伸11 outline → 凸台-拉伸11 (cut)
    with BuildSketch(Plane.XZ.offset(2)):
        with BuildLine():
            Line((71.5, -83), (69.5, -83))
            ThreePointArc((69.5, -83), (70.914213562, -83.585786438), (71.5, -85))
            Line((71.5, -85), (71.5, -83))
        make_face()
        with BuildLine():
            Line((43.5, -83), (41.5, -83))
            Line((41.5, -83), (41.5, -85))
            ThreePointArc((41.5, -85), (42.085786438, -83.585786438), (43.5, -83))
        make_face()
        with BuildLine():
            Line((71.5, -93), (71.5, -91))
            ThreePointArc((71.5, -91), (70.914213562, -92.414213562), (69.5, -93))
            Line((69.5, -93), (71.5, -93))
        make_face()
        with BuildLine():
            Line((41.5, -93), (43.5, -93))
            ThreePointArc((43.5, -93), (42.085786438, -92.414213562), (41.5, -91))
            Line((41.5, -91), (41.5, -93))
        make_face()
    extrude(amount=EXTRUDE_11_DEPTH, mode=Mode.SUBTRACT)

    # Extrude 11 2 outline → Extrude 11 2 (add)
    with BuildSketch(Plane.XZ.offset(2).offset(EXTRUDE_START)):
        with BuildLine():
            Line((71.3, -83), (68, -83))
            ThreePointArc((68, -83), (73, -88), (78, -83))
            Line((78, -83), (74.7, -83))
            ThreePointArc((74.7, -83), (73, -84.7), (71.3, -83))
        make_face()
        with BuildLine():
            ThreePointArc((89, -73), (86.071067812, -80.071067812), (79, -83))
            Line((79, -83), (89, -83))
            Line((89, -83), (89, -73))
        make_face()
        with BuildLine():
            Line((43, -83), (39.7, -83))
            ThreePointArc((39.7, -83), (38, -84.7), (36.3, -83))
            Line((36.3, -83), (34, -83))
            ThreePointArc((34, -83), (26.928932188, -80.071067812), (24, -73))
            Line((24, -73), (24, -83))
            Line((24, -83), (33, -83))
            ThreePointArc((33, -83), (38, -88), (43, -83))
        make_face()
        with BuildLine():
            ThreePointArc((79, -18), (86.071067812, -20.928932188), (89, -28))
            Line((89, -28), (89, -18))
            Line((89, -18), (79, -18))
        make_face()
        with Locations((73, -14.5)):
            Rectangle(EXTRUDE_11_2_OUTLINE_W, EXTRUDE_11_2_OUTLINE_H)
        with BuildLine():
            Line((24, -18), (24, -28))
            ThreePointArc((24, -28), (26.928932188, -20.928932188), (34, -18))
            Line((34, -18), (43, -18))
            Line((43, -18), (43, -11))
            Line((43, -11), (33, -11))
            Line((33, -11), (33, -18))
            Line((33, -18), (24, -18))
        make_face()
    extrude(amount=EXTRUDE_11_2_DEPTH)


solid = part.part
